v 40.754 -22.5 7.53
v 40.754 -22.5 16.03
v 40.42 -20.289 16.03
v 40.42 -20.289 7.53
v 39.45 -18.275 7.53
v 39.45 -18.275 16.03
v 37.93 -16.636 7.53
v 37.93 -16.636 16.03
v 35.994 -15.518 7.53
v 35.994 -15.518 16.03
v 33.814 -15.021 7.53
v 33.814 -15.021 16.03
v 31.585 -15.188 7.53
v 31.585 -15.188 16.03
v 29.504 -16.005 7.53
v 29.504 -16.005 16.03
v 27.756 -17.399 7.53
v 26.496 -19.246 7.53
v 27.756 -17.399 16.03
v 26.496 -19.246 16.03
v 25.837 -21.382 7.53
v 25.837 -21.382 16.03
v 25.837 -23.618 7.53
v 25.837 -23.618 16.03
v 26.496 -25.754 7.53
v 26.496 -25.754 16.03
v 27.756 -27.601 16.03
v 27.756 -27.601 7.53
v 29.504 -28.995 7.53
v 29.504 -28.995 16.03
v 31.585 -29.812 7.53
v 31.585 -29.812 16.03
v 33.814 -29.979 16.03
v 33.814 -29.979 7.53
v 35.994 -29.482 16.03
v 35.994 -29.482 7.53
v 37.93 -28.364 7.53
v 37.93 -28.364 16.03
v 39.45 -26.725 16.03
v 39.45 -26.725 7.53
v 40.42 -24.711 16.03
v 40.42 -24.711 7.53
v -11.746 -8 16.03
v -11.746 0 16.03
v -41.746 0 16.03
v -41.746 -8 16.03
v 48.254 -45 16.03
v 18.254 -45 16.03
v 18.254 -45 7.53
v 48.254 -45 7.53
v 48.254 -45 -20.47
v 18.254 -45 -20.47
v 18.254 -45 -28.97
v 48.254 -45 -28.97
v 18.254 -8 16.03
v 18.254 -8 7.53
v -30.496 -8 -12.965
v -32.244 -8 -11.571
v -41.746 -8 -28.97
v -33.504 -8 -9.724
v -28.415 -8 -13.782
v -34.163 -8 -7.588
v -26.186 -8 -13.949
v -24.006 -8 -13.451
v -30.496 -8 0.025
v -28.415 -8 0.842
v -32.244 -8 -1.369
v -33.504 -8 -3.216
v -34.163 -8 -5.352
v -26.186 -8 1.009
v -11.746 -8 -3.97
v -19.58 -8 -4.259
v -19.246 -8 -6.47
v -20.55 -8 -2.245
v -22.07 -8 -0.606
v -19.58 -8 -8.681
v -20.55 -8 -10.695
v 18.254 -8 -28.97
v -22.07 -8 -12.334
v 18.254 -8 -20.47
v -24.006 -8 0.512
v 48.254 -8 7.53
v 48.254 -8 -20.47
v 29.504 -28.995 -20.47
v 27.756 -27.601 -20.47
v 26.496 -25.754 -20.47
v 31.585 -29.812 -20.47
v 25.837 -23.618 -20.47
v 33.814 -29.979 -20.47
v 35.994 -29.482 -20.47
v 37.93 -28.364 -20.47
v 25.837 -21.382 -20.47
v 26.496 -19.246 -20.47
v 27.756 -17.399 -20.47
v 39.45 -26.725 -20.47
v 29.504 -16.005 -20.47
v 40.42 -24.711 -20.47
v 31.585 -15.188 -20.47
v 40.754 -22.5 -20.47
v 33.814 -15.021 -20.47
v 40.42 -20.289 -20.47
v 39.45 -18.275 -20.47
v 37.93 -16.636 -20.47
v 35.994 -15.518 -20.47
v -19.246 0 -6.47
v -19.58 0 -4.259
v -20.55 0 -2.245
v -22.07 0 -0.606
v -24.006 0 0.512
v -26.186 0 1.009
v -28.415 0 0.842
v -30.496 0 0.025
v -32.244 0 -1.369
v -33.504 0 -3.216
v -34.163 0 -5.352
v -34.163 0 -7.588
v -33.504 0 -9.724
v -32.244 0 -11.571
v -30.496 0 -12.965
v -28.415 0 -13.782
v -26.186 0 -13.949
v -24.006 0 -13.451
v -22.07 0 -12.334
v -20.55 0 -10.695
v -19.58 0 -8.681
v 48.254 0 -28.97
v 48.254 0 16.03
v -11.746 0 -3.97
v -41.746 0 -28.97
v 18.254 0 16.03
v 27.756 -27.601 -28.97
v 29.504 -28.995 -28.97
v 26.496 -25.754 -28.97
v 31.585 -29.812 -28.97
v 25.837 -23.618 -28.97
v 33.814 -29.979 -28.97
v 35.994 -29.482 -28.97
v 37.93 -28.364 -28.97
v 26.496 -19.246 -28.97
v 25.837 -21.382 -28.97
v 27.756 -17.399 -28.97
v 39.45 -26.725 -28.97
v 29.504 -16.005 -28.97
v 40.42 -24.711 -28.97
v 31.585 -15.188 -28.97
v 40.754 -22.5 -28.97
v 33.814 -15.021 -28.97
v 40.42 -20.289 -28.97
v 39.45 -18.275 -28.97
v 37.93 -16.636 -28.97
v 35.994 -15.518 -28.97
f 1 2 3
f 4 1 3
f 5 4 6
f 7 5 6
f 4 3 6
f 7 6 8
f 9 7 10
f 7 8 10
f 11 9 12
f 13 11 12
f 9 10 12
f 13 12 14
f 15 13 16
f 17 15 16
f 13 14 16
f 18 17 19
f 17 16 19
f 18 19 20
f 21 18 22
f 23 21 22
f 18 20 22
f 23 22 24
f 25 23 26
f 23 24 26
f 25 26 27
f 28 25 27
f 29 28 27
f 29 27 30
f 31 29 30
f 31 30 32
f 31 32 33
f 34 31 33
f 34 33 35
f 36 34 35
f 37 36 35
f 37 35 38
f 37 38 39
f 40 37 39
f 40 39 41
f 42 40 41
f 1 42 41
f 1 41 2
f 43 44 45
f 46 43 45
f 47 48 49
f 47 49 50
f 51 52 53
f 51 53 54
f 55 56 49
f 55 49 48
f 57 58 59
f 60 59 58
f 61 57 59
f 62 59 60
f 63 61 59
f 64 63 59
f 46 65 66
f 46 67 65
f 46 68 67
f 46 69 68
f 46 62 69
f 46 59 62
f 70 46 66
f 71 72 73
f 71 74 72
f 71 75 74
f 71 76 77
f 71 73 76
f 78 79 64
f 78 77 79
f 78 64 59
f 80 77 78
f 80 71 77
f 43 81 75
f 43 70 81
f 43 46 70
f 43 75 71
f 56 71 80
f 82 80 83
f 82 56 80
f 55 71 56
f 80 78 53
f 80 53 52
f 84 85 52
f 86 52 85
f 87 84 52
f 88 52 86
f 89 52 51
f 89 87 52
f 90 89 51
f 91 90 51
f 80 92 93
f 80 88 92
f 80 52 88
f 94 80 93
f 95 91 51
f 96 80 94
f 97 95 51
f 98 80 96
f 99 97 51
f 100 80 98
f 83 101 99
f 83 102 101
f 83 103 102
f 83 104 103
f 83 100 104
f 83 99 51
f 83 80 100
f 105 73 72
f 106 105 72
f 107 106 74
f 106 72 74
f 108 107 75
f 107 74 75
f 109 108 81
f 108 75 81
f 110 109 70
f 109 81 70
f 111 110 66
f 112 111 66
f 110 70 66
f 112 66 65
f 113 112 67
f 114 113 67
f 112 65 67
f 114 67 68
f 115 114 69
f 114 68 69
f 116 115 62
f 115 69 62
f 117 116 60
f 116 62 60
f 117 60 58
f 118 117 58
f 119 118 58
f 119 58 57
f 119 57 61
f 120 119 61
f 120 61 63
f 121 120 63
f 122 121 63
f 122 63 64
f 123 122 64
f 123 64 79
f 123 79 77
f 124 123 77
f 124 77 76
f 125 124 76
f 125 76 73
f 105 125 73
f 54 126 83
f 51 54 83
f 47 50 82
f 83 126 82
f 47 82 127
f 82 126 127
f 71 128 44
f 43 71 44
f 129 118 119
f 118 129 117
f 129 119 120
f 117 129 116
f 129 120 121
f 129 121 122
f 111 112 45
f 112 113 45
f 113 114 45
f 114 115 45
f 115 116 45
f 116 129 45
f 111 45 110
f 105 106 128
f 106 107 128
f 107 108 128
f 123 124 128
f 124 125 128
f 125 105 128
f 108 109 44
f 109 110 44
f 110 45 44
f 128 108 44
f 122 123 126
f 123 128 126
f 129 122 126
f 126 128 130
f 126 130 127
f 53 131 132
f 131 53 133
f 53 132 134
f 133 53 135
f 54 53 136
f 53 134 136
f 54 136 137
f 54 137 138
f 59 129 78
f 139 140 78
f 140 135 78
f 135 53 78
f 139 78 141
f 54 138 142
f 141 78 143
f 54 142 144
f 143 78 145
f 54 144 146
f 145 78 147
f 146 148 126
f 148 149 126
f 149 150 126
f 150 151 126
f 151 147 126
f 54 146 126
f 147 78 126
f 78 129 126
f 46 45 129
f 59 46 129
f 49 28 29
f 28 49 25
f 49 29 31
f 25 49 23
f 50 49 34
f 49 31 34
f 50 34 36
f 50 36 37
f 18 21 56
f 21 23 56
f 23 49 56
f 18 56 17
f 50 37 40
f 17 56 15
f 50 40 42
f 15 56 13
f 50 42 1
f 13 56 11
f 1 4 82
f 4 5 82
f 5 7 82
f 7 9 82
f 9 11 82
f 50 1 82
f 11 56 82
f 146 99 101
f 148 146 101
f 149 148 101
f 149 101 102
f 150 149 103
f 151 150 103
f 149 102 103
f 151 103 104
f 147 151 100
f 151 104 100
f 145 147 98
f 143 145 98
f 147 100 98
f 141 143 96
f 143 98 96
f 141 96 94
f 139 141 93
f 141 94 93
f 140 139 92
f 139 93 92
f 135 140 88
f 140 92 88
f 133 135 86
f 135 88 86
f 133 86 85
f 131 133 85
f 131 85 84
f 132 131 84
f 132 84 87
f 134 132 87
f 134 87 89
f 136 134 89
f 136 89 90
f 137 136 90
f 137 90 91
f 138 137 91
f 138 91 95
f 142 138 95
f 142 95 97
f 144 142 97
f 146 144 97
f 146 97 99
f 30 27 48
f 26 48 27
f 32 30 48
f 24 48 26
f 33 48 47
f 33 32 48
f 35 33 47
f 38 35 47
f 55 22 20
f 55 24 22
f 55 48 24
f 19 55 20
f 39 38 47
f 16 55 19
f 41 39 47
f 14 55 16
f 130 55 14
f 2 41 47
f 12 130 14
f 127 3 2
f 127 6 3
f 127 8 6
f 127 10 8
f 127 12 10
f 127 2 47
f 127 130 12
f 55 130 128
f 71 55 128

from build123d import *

# Parameters (mm, degrees)
F1_DEPTH = 8
F2_W     = 30
F2_H     = 8.5
F3_DEPTH = 37
F4_R     = 7.5
F5_DEPTH = 45.001
F6_R     = 7.5
F7_DEPTH = 8.001


with BuildPart() as f1:
    # F0 (on Front) → F1 (new body)
    with BuildSketch(Plane.XZ):
        Polygon((-41.746499, -28.969837), (48.253501, -28.969837), (48.253501, 16.030163), (18.253501, 16.030163), (-11.746499, -3.969837), (-11.746499, 16.030163), (-41.746499, 16.030163), align=None)
    extrude(amount=F1_DEPTH)

    # F2 (on face) → F3 (join)
    with BuildSketch(Plane.XZ.offset(8)):
        with Locations((33.253501, 11.780163)):
            Rectangle(F2_W, F2_H)
        with Locations((33.253501, -24.719837)):
            Rectangle(F2_W, F2_H)
    extrude(amount=F3_DEPTH)

    # F4 (on face) → F5 (cut, through all)
    with BuildSketch(Plane.XY.offset(16.030163)):
        with Locations((33.253501, -22.5)):
            Circle(F4_R)
    extrude(amount=-F5_DEPTH, mode=Mode.SUBTRACT)

    # F6 (on face) → F7 (cut, through all)
    with BuildSketch(Plane.XZ.offset(8)):
        with Locations((-26.746499, -6.469837)):
            Circle(F6_R)
    extrude(amount=-F7_DEPTH, mode=Mode.SUBTRACT)


solid = f1.part
